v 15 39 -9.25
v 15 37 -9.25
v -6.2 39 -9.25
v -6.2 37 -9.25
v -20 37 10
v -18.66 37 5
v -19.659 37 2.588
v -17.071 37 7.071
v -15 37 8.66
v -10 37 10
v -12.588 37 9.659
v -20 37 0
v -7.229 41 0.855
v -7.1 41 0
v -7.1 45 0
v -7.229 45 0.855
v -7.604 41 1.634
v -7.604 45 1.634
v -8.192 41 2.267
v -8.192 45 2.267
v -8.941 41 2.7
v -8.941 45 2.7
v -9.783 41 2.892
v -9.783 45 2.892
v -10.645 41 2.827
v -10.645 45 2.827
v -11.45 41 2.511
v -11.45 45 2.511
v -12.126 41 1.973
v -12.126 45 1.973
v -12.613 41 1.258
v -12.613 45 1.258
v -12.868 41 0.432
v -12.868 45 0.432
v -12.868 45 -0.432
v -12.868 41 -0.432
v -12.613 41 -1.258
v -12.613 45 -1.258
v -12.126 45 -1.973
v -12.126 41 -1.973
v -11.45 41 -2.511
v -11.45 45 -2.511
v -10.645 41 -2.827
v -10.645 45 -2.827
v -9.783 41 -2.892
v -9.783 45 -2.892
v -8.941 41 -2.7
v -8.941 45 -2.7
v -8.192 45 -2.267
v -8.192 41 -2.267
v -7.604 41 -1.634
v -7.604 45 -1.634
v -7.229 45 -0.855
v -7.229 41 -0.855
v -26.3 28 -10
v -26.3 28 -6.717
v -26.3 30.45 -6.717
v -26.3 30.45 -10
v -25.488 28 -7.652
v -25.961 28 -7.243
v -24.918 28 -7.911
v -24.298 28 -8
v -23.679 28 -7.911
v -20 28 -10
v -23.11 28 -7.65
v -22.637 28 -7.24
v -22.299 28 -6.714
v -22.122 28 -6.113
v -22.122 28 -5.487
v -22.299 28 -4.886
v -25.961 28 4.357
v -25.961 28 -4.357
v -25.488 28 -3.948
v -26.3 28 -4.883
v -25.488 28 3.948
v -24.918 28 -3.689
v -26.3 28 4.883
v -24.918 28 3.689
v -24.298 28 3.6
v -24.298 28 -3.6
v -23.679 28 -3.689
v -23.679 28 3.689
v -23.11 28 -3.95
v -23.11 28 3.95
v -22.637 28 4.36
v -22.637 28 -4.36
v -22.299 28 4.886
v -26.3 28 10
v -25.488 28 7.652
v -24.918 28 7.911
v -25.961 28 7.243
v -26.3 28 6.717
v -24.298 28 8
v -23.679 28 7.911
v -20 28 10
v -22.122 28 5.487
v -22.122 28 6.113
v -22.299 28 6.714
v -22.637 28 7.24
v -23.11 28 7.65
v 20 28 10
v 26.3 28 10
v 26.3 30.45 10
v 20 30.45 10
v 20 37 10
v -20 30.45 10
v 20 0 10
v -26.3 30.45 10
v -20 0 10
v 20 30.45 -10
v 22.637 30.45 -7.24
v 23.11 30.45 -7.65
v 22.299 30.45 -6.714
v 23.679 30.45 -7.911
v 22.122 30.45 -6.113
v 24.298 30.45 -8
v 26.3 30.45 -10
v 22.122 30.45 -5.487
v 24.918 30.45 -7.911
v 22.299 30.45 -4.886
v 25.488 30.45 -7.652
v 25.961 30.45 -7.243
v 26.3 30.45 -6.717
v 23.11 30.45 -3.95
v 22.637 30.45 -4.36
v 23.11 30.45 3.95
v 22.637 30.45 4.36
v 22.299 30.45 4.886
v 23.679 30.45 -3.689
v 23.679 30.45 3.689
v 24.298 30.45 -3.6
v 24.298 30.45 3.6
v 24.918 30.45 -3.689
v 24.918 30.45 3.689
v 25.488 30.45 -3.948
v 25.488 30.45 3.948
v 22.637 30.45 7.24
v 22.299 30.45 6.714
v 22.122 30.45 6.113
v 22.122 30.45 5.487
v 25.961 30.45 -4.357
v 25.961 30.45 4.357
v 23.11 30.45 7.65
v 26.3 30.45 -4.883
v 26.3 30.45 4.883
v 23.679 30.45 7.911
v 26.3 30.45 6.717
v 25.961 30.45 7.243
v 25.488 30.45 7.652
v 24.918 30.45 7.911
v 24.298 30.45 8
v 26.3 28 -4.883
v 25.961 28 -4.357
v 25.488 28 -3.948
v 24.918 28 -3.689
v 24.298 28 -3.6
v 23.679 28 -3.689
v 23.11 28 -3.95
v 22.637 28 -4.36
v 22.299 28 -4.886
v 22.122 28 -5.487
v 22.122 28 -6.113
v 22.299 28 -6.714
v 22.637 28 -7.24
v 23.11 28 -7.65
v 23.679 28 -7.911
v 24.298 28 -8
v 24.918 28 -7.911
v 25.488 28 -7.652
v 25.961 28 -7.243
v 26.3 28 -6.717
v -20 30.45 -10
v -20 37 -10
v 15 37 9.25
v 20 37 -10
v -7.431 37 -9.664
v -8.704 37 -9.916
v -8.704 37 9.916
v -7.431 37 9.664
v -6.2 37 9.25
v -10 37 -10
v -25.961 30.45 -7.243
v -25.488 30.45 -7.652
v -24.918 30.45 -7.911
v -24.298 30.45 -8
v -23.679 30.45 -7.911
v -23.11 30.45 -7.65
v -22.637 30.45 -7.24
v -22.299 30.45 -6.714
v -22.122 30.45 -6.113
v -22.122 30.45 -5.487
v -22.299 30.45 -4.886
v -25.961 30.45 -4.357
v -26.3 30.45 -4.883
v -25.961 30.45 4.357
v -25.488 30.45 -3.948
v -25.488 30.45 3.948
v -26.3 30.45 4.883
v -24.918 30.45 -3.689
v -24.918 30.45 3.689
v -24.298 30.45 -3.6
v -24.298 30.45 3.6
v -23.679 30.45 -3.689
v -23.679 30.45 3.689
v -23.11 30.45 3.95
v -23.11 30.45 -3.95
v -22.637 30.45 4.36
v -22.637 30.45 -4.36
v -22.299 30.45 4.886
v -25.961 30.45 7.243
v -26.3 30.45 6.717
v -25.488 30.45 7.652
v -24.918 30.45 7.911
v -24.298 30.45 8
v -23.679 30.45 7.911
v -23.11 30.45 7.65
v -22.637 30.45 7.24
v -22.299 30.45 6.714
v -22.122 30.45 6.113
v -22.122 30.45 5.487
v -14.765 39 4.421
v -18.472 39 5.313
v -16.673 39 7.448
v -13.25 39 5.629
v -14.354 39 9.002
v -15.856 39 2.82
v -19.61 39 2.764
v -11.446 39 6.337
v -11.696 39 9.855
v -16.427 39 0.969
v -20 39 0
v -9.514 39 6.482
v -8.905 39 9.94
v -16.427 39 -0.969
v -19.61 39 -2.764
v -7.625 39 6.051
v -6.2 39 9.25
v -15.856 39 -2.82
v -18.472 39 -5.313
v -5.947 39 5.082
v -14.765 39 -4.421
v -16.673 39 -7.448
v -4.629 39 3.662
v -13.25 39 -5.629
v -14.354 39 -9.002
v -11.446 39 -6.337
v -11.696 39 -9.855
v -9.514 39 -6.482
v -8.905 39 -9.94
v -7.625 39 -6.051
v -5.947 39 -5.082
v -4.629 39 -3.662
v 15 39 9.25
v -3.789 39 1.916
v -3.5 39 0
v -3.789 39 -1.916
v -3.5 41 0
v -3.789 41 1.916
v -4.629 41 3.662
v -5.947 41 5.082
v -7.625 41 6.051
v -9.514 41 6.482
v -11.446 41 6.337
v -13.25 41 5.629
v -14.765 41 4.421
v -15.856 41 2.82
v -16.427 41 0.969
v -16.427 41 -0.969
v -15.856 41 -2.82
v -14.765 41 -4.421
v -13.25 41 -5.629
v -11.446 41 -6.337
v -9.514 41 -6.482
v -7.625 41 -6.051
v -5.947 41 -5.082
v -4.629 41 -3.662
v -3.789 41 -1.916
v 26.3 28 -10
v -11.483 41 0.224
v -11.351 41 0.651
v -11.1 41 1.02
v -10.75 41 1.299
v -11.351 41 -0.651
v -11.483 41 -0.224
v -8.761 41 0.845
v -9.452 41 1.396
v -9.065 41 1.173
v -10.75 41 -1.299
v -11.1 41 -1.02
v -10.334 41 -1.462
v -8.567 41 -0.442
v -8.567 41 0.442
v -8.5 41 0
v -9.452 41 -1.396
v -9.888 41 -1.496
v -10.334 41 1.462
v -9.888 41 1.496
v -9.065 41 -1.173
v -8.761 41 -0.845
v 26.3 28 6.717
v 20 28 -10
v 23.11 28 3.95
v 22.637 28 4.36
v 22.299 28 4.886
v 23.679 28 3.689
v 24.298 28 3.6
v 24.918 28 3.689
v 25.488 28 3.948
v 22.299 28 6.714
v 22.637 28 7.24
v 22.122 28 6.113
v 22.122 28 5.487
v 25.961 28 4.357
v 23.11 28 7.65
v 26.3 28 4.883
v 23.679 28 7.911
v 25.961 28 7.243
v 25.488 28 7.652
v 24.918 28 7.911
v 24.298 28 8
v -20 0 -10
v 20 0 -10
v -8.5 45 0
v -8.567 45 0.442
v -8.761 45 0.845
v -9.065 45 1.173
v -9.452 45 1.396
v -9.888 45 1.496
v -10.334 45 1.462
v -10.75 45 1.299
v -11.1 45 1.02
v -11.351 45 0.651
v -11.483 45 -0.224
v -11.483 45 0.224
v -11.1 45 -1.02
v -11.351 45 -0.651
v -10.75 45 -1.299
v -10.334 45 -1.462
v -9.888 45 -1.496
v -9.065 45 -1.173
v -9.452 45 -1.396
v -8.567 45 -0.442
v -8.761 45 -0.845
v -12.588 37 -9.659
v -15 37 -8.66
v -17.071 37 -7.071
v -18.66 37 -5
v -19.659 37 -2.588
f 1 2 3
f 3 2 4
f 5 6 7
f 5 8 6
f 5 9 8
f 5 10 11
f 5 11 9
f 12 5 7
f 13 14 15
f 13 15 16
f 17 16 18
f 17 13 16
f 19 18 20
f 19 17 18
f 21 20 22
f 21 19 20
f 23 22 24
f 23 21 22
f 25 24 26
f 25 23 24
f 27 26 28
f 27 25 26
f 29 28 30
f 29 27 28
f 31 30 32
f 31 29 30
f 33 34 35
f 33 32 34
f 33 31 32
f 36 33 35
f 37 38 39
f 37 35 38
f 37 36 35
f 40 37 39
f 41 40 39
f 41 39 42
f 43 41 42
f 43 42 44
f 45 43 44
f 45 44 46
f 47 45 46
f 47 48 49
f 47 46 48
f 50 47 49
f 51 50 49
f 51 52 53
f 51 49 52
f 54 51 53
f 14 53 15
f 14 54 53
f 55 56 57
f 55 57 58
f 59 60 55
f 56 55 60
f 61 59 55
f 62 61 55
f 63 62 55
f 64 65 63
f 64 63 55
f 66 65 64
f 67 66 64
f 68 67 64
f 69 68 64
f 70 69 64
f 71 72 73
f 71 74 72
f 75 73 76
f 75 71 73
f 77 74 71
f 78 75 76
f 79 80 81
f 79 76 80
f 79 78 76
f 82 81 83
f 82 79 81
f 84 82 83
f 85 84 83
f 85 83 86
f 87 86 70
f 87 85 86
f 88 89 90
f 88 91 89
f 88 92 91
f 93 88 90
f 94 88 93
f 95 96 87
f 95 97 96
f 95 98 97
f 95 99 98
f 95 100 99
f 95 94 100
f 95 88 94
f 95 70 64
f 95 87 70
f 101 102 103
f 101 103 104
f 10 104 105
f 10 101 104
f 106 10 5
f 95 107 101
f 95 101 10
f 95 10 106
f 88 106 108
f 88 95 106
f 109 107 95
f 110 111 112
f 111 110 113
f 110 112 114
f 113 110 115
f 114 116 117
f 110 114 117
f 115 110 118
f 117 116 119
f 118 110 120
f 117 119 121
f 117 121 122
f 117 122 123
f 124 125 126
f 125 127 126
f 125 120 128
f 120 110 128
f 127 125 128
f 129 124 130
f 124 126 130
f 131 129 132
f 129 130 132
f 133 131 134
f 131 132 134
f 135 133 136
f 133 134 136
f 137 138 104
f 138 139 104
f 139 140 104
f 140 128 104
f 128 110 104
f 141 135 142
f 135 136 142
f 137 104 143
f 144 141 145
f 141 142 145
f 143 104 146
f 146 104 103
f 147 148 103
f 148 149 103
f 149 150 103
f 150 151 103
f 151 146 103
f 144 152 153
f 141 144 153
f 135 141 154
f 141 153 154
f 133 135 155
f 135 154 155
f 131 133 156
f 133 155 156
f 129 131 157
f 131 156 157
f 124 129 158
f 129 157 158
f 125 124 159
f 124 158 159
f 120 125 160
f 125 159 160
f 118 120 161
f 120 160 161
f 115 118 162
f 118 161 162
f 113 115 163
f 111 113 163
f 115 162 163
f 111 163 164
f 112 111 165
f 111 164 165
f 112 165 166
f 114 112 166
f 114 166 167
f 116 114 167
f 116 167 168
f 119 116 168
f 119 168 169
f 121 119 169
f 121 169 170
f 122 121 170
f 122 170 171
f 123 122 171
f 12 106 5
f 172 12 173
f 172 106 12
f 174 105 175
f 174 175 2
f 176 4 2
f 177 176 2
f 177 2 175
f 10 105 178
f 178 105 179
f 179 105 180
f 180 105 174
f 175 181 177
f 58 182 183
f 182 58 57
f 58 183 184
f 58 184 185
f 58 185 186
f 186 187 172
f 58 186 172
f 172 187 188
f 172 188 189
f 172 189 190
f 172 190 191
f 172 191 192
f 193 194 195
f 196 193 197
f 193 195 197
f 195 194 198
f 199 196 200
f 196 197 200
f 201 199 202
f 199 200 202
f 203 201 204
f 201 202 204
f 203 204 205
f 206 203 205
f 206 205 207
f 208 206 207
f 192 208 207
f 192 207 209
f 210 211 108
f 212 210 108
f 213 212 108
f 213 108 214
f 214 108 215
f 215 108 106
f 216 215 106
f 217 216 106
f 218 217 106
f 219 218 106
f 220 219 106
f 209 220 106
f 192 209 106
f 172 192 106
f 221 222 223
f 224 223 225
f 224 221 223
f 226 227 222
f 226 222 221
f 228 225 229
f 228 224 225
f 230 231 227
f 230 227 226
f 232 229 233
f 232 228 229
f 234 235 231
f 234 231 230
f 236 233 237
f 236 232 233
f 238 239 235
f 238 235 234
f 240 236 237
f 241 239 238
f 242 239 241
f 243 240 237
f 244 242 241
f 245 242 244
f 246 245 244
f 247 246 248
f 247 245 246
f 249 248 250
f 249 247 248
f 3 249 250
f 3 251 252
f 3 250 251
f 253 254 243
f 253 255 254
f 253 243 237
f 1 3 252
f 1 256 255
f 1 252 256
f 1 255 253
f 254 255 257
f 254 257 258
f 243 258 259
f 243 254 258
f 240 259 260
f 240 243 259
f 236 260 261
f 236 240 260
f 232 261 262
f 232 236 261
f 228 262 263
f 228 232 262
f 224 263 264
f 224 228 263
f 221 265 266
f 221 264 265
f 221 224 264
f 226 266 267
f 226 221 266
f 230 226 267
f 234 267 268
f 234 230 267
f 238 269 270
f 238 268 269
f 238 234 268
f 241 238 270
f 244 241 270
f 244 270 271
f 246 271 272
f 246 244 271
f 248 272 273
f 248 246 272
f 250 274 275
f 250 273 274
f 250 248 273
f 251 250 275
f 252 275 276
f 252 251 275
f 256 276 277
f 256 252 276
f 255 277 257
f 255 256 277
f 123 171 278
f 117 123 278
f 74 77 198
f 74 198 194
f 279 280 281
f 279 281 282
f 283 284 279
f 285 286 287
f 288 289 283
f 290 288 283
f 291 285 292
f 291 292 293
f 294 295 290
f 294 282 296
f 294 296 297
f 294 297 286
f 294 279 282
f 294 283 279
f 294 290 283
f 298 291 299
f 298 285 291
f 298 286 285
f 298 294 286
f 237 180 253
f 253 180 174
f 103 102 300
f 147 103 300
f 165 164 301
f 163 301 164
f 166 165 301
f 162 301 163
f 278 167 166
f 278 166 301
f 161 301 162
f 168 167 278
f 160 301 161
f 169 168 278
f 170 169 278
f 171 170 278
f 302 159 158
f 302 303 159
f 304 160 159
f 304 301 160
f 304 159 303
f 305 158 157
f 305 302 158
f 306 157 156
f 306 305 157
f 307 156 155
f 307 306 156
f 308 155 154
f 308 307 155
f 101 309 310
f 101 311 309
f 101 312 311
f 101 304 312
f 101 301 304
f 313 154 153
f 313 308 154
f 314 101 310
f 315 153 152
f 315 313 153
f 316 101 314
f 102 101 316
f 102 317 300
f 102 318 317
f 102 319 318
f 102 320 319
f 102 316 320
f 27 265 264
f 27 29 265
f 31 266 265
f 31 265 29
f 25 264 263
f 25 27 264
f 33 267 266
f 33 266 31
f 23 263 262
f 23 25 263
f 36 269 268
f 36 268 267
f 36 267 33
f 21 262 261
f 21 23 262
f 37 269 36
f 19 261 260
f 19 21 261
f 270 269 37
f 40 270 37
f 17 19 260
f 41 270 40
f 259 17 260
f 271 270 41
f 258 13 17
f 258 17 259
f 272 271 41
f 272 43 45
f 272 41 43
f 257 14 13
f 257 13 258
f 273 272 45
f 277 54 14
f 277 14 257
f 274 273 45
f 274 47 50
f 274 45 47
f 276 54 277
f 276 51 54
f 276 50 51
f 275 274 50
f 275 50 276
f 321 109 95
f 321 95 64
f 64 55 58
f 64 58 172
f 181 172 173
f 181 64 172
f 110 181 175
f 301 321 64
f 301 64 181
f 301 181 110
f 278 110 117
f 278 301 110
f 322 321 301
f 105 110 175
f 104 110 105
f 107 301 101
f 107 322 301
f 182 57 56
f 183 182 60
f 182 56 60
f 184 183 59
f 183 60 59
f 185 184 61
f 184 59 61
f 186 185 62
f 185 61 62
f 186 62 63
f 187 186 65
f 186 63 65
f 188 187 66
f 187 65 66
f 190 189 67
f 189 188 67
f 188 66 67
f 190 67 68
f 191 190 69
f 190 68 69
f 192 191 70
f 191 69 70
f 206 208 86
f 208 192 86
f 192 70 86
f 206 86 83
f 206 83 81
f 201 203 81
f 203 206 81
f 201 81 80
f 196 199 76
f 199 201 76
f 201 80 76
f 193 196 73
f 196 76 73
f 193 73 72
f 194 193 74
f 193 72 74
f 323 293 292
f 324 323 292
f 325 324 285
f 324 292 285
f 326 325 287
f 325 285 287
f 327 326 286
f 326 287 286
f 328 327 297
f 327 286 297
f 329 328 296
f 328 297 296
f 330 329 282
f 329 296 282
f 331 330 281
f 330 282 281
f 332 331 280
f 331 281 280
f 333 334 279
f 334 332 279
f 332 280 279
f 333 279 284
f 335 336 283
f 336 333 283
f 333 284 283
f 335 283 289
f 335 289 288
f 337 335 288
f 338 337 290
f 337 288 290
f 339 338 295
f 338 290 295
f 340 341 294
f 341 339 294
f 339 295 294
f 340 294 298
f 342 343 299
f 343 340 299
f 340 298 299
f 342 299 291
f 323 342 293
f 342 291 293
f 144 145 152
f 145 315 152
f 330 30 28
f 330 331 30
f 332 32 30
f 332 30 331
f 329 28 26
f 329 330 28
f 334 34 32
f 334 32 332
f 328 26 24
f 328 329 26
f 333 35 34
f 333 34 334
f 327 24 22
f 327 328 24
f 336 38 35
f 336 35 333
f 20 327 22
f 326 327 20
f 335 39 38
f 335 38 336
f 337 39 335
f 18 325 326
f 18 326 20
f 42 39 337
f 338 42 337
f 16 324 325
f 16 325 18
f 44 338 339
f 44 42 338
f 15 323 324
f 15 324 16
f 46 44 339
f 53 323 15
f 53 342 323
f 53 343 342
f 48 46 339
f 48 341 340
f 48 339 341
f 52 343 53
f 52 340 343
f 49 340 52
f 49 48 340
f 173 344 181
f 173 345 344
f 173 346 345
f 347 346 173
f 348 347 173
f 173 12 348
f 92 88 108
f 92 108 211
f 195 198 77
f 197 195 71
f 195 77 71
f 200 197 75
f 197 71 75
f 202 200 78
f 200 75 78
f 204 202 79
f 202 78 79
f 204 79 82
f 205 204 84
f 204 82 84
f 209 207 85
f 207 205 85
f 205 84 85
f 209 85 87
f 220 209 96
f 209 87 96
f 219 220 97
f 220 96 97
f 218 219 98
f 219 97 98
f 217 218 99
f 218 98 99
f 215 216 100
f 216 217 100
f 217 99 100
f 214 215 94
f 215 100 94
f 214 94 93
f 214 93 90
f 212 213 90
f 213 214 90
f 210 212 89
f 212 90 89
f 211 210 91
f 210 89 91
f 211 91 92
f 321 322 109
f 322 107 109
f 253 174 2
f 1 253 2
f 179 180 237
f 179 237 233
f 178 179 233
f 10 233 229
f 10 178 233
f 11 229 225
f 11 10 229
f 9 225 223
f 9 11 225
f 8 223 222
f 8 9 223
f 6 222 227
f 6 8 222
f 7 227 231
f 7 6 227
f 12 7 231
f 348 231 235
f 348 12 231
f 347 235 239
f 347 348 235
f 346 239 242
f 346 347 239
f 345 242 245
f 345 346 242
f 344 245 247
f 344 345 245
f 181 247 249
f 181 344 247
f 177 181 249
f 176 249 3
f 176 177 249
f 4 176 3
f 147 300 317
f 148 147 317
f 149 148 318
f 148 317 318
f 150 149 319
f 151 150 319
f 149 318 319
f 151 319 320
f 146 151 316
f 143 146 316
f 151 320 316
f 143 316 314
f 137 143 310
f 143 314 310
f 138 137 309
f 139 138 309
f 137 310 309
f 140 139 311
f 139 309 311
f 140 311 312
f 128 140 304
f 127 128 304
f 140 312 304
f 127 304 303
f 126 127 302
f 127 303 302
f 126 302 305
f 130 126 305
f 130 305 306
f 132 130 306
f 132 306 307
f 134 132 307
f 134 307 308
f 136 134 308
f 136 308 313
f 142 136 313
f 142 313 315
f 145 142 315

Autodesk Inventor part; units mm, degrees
ref_plane "YZ Plane" through (0, 0, 0) normal (1, 0, 0) x (0, 1, 0)
ref_plane "XZ Plane" through (0, 0, 0) normal (0, 1, 0) x (-1, 0, 0)
sketch "Sketch1" plane through (0, 0, 0) normal (0, 1, 0) x (-1, 0, 0)
  line L0 (-20, 10) -> (20, 10)
  line L1 (20, 10) -> (20, -10)
  line L2 (20, -10) -> (-20, -10)
  line L3 (-20, -10) -> (-20, 10)
  line L4 (-20, 10) -> (20, -10) construction
  line L5 (20, 10) -> (-20, -10) construction
  point P0 (0, 0)
  dimension "d0" = 40
  dimension "d1" = 20
extrude "Extrusion1" add sketch "Sketch1" along normal blind 37
sketch "Sketch2" plane through (0, 37, 0) normal (0, 1, 0) x (1, 0, 0)
  line L0 (20, 10) -> (-20, 10) projected
  line L1 (-20, 10) -> (-20, -10) projected
  line L2 (-20, -10) -> (20, -10) projected
  line L3 (20, -10) -> (20, 10) projected
  circle A0 centre (-10, 0) radius 10
  line L4 (-20, 10) -> (-20, -10) projected
  line L5 (15, -10) -> (15, 10)
  line L6 (15, 9.25) -> (-6.2003, 9.25)
  line L7 (-6.2003, -9.25) -> (15, -9.25)
  point P0 (0, 0)
  dimension "d4" = 5
extrude "Extrusion2" add sketch "Sketch2" along normal blind 2 contours A0 | L5 L7 A0 L6
sketch "Sketch3" plane through (0, 39, 0) normal (0, 1, 0) x (1, 0, 0)
  line L0 (-6.2003, -9.25) -> (15, -9.25) projected
  line L1 (15, -9.25) -> (15, 9.25) projected
  line L2 (15, 9.25) -> (-6.2003, 9.25) projected
  arc A0 (-6.2003, 9.25) -> (-6.2003, -9.25) centre (-10, 0) ccw projected
  circle A1 centre (-10, 0) radius 6.5
  point P0 (0, 0)
  dimension "d8" = 13
extrude "Extrusion3" add sketch "Sketch3" along normal blind 2 contours A1
sketch "Sketch4" plane through (-10, 41, 0) normal (0, 1, 0) x (1, 0, 0)
  circle A0 centre (0, 0) radius 6.5 projected
  circle A1 centre (0, 0) radius 2.9
  circle A2 centre (0, 0) radius 1.5
  point P0 (10, 0)
  dimension "d11" = 5.8
  dimension "d12" = 3
extrude "Extrusion4" add sketch "Sketch4" along normal blind 4 contours A1
ref_plane "Work Plane1" through (0, 28, 0) normal (0, -1, 0) x (1, 0, 0)
sketch "Sketch5" plane through (0, 28, 0) normal (0, -1, 0) x (1, 0, 0)
  arc A0 (-10, -10) -> (-6.2003, -9.25) centre (-10, 0) ccw projected
  line L0 (-6.2003, -9.25) -> (15, -9.25) projected
  line L1 (15, -9.25) -> (15, 9.25) projected
  line L2 (15, 9.25) -> (-6.2003, 9.25) projected
  arc A1 (-6.2003, 9.25) -> (-10, 10) centre (-10, 0) ccw projected
  line L3 (-10, 10) -> (20, 10) projected
  line L4 (20, 10) -> (20, -10) projected
  line L5 (20, -10) -> (-10, -10) projected
  arc A2 (-10, 10) -> (-20, 0) centre (-10, 0) ccw projected
  line L6 (-20, 0) -> (-20, 10) projected
  line L7 (-20, 10) -> (-10, 10) projected
  arc A3 (-20, 0) -> (-10, -10) centre (-10, 0) ccw projected
  line L8 (-10, -10) -> (-20, -10) projected
  line L9 (-20, -10) -> (-20, 0) projected
  line L10 (-20, 10) -> (-26.3, 10)
  line L11 (-26.3, 10) -> (-26.3, -10)
  line L12 (-26.3, -10) -> (-20, -10)
  line L13 (-20, -10) -> (-20, 10)
  line L14 (20, 10) -> (26.3, 10)
  line L15 (26.3, 10) -> (26.3, -10)
  line L16 (26.3, -10) -> (20, -10)
  line L17 (20, -10) -> (20, 10)
  circle A4 centre (24.3, 5.8) radius 2.2
  line L18 (20, 5.8) -> (22.1, 5.8) construction
  line L19 (0, -10) -> (0, -15.1491)
  line L20 (20, 10) -> (20, -10) projected
  line L21 (20, 0) -> (22.5191, 0)
  line L22 (24.3, 8) -> (24.3, 10) construction
  circle A5 centre (24.3, -5.8) radius 2.2
  circle A6 centre (-24.3, 5.8) radius 2.2
  circle A7 centre (-24.3, -5.8) radius 2.2
  point P0 (0, 0)
  point P1 (26.3, -6.7165)
  point P2 (26.3, -4.8835)
  point P3 (26.3, 4.8835)
  point P4 (26.3, 6.7165)
  point P5 (-26.3, 6.7165)
  point P6 (-26.3, 4.8835)
  point P7 (-26.3, -4.8835)
  point P8 (-26.3, -6.7165)
  point P9 (-20, 0)
  dimension "d16" = 6.3
  dimension "d17" = 6.3
  dimension "d18" = 4.4
  dimension "d19" = 2.1
  dimension "d20" = 2
extrude "Extrusion5" add sketch "Sketch5" against normal blind 2.45 contours L9 L12 L11 A7 A6 L10 L6 | L4 L14 L15 A4 A5 L16
equation "\"d16\" = d17"
properties part number "MG996R"
